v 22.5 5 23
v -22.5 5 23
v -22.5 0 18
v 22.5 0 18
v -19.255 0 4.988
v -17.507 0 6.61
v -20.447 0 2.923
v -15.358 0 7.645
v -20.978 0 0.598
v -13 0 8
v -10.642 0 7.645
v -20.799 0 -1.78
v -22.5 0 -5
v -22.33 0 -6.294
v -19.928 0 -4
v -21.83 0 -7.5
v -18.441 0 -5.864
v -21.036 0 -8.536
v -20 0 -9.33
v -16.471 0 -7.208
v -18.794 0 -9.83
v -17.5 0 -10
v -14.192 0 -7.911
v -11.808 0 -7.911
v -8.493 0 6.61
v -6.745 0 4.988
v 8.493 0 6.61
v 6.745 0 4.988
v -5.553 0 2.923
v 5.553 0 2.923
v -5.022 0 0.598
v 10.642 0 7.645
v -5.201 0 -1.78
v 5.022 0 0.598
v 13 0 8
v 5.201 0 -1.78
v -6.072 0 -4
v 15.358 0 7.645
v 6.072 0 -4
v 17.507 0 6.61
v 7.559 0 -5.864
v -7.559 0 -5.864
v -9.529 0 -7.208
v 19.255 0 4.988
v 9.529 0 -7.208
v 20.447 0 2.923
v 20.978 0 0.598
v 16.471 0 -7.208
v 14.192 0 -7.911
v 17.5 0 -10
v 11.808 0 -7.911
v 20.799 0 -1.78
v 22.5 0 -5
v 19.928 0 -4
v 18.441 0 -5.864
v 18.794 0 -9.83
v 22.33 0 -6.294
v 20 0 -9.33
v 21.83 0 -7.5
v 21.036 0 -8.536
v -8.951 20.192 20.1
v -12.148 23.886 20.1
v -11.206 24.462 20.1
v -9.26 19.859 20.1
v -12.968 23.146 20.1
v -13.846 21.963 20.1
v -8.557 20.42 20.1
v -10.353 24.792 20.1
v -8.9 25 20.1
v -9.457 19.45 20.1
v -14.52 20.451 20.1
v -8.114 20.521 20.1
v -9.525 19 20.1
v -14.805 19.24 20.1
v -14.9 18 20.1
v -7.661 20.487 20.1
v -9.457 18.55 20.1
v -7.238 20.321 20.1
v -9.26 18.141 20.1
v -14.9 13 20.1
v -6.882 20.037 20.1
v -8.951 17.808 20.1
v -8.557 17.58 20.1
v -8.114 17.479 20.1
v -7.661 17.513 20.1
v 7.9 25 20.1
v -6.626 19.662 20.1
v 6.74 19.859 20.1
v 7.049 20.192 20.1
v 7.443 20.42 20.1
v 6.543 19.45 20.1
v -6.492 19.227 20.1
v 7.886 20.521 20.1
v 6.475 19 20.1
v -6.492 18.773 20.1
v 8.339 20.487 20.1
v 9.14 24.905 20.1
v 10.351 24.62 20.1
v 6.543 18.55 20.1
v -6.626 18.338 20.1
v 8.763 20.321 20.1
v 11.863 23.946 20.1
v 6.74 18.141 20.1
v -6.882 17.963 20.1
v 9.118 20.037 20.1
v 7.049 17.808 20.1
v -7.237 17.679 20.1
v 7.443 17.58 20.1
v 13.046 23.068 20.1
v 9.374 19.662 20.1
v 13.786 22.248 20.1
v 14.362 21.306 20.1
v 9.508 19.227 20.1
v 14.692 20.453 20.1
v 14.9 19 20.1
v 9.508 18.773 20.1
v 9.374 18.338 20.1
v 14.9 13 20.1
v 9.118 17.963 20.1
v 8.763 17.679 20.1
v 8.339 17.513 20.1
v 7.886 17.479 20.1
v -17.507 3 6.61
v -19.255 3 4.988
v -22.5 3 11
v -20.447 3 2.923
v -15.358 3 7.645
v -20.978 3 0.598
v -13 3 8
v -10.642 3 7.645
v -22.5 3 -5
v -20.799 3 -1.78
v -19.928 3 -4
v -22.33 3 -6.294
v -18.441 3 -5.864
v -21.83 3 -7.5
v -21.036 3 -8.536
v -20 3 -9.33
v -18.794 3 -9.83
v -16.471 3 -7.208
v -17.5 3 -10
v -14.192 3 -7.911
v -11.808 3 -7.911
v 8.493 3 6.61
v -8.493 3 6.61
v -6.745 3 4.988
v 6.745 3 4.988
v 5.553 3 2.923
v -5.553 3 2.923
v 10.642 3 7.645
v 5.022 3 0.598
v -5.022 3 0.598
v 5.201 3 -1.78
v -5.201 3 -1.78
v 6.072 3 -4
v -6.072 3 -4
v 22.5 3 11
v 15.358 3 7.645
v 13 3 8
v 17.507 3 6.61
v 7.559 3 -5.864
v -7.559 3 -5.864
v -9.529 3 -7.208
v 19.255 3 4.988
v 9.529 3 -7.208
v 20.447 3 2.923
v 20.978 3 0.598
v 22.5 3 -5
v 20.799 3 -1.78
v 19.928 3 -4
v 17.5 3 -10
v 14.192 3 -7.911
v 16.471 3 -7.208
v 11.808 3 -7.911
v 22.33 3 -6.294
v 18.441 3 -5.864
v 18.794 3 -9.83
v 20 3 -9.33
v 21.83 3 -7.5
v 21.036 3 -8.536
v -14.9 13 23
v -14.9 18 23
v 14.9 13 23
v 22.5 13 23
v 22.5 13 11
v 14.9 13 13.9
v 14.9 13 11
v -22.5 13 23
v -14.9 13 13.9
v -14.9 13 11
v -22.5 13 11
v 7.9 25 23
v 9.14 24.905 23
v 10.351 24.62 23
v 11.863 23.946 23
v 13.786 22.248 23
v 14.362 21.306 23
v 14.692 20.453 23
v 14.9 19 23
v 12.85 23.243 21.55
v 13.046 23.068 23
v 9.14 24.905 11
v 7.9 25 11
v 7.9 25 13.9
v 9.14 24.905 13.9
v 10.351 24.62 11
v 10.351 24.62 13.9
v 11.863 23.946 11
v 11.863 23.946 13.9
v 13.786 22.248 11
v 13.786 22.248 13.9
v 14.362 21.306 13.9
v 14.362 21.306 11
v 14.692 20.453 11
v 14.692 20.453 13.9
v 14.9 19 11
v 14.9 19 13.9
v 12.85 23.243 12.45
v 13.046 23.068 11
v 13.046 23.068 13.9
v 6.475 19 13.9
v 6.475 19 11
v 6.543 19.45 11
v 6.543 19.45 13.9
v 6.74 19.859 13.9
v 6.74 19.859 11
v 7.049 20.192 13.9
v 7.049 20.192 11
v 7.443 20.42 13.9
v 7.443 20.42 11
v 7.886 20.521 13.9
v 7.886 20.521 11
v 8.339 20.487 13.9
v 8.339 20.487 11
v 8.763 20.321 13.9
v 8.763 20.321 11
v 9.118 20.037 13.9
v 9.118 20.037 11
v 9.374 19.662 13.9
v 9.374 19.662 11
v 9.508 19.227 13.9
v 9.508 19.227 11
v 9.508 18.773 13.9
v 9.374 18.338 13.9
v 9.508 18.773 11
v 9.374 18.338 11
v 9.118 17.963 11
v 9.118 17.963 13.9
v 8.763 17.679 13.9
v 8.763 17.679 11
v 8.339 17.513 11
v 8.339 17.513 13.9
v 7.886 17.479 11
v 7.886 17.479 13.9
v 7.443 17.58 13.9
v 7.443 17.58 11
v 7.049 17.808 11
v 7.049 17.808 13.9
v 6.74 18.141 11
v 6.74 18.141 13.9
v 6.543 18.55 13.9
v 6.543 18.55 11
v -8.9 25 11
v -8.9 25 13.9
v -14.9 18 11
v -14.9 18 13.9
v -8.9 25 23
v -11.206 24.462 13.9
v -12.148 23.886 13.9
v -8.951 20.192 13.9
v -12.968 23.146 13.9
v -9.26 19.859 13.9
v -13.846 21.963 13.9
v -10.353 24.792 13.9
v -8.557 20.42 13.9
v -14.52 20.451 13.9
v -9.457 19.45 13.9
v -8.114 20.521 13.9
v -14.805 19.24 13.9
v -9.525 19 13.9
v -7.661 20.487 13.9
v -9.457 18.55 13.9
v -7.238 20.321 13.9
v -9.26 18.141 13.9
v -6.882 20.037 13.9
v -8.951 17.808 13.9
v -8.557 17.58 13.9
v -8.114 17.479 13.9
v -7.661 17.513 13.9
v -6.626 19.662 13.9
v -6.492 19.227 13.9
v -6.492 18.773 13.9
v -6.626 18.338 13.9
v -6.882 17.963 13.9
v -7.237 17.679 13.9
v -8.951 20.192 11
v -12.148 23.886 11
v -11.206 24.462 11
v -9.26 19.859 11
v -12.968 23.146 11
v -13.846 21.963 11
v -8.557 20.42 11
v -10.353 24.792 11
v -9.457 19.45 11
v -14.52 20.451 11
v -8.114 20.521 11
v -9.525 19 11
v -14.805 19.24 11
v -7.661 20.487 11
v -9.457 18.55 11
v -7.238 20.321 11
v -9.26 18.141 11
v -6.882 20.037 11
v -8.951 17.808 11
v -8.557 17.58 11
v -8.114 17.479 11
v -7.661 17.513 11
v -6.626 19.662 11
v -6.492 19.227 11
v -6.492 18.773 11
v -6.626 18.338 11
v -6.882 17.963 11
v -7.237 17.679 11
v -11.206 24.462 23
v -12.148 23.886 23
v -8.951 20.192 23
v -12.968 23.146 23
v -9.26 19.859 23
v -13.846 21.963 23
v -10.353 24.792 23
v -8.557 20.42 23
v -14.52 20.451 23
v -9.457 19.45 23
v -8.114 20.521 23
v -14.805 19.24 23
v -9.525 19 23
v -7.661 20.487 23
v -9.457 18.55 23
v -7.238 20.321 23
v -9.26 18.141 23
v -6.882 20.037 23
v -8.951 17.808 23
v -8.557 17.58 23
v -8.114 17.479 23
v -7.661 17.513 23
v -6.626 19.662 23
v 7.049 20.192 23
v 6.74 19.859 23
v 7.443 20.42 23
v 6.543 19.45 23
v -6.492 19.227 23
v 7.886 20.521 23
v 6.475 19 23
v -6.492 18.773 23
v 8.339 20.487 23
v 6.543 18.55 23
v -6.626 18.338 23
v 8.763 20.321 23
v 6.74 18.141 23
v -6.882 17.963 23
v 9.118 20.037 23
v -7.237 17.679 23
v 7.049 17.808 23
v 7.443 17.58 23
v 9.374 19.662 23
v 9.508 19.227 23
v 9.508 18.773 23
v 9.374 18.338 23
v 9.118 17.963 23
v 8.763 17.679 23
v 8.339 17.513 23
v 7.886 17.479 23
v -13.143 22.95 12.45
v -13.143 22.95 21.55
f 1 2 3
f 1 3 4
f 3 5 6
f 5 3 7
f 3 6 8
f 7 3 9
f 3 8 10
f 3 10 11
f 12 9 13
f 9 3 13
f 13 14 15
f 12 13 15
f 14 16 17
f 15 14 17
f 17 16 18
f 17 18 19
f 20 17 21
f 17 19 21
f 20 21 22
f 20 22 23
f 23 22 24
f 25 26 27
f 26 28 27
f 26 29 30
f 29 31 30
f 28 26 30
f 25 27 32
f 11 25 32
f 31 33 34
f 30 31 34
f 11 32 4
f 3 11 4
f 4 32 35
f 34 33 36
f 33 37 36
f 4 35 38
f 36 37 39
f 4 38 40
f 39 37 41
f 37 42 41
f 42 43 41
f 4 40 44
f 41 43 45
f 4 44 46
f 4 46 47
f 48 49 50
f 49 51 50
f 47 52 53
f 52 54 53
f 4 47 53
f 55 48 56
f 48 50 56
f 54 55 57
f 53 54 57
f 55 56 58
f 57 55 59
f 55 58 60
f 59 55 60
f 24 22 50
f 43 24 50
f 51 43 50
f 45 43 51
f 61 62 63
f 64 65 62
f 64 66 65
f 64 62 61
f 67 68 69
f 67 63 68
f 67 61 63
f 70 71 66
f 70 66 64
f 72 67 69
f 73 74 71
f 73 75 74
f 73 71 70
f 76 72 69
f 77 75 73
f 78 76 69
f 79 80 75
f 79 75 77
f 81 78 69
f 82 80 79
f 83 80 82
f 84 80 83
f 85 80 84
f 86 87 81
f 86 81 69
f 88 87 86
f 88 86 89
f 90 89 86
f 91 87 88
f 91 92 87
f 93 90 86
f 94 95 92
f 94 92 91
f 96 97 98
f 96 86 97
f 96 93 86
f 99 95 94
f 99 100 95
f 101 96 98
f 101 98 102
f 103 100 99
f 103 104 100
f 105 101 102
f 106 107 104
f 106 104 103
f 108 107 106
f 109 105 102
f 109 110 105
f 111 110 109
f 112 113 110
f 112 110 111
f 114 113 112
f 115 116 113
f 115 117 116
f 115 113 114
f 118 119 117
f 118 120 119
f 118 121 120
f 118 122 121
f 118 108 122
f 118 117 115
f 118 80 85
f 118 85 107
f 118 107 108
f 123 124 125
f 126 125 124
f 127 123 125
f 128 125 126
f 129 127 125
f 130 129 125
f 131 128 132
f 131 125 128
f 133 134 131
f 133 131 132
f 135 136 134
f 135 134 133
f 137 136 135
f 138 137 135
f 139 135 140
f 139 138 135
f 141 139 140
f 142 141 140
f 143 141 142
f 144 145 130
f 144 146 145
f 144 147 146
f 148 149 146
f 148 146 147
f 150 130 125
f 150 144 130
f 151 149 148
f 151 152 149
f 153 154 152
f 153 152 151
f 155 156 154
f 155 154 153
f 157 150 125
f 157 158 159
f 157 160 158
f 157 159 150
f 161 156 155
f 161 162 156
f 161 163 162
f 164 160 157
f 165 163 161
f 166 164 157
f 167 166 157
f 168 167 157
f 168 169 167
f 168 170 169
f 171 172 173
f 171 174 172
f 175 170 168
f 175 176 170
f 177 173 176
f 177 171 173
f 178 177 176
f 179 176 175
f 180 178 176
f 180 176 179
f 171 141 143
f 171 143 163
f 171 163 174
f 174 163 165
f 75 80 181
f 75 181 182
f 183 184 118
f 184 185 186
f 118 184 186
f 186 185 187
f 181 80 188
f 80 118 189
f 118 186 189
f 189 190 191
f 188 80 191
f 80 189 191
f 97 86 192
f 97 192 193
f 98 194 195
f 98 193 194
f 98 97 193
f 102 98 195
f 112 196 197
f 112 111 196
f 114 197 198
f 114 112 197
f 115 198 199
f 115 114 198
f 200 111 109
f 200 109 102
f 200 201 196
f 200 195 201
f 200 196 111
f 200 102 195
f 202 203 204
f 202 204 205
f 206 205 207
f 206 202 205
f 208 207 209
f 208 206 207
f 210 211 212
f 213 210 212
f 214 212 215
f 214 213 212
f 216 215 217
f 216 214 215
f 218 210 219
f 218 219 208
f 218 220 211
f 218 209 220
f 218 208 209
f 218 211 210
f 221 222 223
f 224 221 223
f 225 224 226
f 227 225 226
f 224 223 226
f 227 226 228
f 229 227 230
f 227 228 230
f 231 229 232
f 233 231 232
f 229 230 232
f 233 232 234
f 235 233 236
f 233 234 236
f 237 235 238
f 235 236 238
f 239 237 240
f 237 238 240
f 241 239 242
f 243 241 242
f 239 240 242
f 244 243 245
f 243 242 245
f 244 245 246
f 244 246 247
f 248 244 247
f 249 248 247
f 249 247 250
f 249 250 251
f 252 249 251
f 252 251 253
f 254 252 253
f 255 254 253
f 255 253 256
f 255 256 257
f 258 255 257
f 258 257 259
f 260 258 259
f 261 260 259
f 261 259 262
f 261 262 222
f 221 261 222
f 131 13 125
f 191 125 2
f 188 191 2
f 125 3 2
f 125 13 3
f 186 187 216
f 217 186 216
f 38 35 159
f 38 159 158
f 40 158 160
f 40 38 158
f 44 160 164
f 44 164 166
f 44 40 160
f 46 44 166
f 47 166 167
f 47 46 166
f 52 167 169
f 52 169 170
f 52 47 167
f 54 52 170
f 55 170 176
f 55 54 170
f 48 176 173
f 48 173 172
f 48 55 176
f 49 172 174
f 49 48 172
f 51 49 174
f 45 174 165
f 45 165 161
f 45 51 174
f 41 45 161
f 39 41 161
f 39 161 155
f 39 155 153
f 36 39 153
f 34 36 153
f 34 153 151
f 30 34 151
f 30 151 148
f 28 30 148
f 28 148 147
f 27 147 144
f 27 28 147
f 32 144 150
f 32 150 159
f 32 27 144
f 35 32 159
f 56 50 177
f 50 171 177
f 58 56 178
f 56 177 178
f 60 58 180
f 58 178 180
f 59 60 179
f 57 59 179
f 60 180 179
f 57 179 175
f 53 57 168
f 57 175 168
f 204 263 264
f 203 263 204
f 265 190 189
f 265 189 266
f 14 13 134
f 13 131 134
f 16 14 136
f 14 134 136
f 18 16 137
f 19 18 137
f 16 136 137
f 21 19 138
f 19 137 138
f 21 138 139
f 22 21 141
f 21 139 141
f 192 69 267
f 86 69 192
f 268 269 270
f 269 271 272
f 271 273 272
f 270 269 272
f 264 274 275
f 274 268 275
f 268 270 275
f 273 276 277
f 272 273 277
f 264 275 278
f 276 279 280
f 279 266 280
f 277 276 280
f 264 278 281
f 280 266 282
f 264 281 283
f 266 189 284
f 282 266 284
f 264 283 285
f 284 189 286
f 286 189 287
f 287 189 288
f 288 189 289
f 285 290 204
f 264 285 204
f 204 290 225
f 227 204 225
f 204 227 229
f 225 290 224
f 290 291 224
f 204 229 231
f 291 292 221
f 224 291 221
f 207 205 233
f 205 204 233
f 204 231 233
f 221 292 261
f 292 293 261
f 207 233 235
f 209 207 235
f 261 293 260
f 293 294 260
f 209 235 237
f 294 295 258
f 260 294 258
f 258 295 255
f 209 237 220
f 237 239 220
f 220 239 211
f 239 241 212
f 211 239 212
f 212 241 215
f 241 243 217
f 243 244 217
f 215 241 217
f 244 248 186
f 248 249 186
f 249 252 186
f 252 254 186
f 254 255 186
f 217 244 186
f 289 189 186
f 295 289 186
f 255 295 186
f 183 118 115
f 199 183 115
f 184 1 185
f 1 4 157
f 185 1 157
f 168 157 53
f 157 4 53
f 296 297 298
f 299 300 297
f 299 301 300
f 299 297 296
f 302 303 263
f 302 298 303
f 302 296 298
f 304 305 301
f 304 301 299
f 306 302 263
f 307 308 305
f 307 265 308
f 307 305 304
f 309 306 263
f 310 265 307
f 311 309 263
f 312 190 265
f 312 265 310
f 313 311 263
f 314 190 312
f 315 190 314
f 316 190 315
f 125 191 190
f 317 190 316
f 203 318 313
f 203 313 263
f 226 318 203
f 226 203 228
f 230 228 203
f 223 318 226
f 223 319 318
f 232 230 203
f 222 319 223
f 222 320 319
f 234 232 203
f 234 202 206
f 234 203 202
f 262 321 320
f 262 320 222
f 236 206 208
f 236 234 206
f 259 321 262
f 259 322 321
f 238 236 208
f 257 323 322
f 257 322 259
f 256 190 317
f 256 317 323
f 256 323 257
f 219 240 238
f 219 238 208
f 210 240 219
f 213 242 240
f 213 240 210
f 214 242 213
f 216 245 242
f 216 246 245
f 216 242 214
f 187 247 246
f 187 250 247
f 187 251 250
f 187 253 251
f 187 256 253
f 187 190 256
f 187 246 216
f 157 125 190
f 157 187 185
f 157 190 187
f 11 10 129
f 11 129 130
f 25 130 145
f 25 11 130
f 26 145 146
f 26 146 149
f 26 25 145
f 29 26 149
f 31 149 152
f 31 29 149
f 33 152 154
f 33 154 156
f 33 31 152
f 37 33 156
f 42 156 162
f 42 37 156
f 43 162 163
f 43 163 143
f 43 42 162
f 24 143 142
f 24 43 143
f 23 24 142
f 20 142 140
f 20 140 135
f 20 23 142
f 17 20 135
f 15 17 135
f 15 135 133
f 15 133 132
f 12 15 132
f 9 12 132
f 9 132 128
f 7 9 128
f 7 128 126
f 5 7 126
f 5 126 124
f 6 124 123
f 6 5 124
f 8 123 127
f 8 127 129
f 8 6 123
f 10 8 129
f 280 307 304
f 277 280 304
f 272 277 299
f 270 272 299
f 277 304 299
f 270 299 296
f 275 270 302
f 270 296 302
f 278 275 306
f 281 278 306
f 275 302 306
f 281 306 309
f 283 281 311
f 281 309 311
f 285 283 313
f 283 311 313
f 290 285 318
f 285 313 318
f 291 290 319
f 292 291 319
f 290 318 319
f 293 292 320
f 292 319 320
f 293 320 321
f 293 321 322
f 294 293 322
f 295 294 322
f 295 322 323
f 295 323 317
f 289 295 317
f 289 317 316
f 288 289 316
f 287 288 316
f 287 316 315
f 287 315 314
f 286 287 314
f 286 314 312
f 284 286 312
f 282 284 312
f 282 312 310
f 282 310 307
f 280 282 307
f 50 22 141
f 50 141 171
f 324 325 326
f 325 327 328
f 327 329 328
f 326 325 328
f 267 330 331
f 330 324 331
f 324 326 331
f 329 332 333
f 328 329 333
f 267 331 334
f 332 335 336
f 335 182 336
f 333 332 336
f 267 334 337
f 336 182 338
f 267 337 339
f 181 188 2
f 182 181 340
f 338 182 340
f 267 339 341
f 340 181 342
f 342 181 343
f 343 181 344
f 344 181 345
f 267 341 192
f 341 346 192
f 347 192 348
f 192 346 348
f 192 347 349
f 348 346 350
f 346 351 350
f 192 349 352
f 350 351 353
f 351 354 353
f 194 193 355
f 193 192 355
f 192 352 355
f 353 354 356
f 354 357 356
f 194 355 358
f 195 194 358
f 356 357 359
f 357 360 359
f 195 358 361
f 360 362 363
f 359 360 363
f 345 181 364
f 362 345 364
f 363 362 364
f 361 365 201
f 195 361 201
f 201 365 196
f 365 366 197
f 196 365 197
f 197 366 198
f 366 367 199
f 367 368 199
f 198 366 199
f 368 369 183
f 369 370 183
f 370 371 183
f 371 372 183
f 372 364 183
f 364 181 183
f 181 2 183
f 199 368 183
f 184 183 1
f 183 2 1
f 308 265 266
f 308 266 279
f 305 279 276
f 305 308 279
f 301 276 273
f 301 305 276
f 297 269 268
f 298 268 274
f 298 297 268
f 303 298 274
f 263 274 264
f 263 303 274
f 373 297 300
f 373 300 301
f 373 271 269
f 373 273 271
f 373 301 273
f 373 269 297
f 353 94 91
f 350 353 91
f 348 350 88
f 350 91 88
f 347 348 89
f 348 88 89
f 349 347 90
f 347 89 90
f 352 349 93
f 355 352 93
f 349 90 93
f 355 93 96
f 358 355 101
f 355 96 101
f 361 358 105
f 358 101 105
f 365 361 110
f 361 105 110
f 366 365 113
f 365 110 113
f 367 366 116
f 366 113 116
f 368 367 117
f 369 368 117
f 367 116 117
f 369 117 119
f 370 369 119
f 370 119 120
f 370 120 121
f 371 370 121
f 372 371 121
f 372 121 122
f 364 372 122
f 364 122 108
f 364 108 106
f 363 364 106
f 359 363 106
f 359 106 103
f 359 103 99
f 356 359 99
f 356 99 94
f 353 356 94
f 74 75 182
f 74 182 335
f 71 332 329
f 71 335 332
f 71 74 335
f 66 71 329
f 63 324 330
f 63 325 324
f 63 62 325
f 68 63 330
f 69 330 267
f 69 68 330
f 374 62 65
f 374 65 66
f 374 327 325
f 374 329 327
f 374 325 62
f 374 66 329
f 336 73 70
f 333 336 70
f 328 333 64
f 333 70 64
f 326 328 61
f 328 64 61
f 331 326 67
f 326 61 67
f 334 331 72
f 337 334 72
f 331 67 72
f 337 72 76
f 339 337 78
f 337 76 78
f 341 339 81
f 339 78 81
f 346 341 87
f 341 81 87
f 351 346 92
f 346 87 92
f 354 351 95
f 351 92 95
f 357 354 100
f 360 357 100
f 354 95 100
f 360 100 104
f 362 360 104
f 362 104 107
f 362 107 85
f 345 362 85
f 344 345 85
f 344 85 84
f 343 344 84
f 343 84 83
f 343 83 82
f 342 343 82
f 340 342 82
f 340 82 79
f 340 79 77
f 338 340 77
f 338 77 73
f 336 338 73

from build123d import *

# Parameters (mm, degrees)
SKETCH1_W           = 45
SKETCH1_H           = 20
SKETCH1_R           = 8
SKETCH1_H_2         = 13
SKETCH1_H_3         = 1
BOSS_EXTRUDE1_DEPTH = 3
SKETCH3_W           = 45
SKETCH3_H           = 2.9
SKETCH3_H_2         = 6.2
BOSS_EXTRUDE2_DEPTH = 10
SKETCH3_3_W         = 45
SKETCH3_3_H         = 2.9
BOSS_EXTRUDE3_DEPTH = 22
SKETCH6_R           = 1.525
SKETCH6_W           = 7.6
SKETCH6_H           = 12
CUT_EXTRUDE2_DEPTH  = 16.5
CHAMFER1_SIZE       = 5
FILLET2_R           = 5
FILLET3_SIZE        = 7
FILLET3_SIZE_2      = 6


with BuildPart() as part:
    # Sketch1 → Boss-Extrude1 (new body)
    # profile 1 of 3: a face of its own
    with BuildSketch(Plane(origin=(0, 0, 0), x_dir=(1, 0, 0), z_dir=(0, 1, 0))):
        Rectangle(SKETCH1_W, SKETCH1_H)
        with Locations(Location((13, 0, 0), (0, 0, 270))):
            Circle(SKETCH1_R, mode=Mode.SUBTRACT)
        with Locations(Location((-13, 0, 0), (0, 0, 270))):
            Circle(SKETCH1_R, mode=Mode.SUBTRACT)
    # profile 2 of 3: a face of its own
    with BuildSketch(Plane(origin=(0, 0, 0), x_dir=(1, 0, 0), z_dir=(0, 1, 0))):
        with Locations((0, -16.5)):
            Rectangle(SKETCH1_W, SKETCH1_H_2)
    # profile 3 of 3: a face of its own
    with BuildSketch(Plane(origin=(0, 0, 0), x_dir=(1, 0, 0), z_dir=(0, 1, 0))):
        with Locations((0, -10.5)):
            Rectangle(SKETCH1_W, SKETCH1_H_3)
    extrude(amount=BOSS_EXTRUDE1_DEPTH)

    # Sketch3 → Boss-Extrude2 (add)
    with BuildSketch(Plane(origin=(0, 3, 0), x_dir=(1, 0, 0), z_dir=(0, 1, 0))):
        with Locations((0, -21.55)):
            Rectangle(SKETCH3_W, SKETCH3_H)
        with Locations((0, -17)):
            Rectangle(SKETCH3_W, SKETCH3_H_2)
        with Locations((0, -12.45)):
            Rectangle(SKETCH3_W, SKETCH3_H)
    extrude(amount=BOSS_EXTRUDE2_DEPTH)

    # Sketch3<3> → Boss-Extrude3 (add)
    with BuildSketch(Plane(origin=(0, 3, 0), x_dir=(1, 0, 0), z_dir=(0, 1, 0))):
        with Locations((0, -12.45)):
            Rectangle(SKETCH3_3_W, SKETCH3_3_H)
        with Locations((0, -21.55)):
            Rectangle(SKETCH3_3_W, SKETCH3_3_H)
    extrude(amount=BOSS_EXTRUDE3_DEPTH)

    # Sketch6 → Cut-Extrude2 (cut)
    with BuildSketch(Plane(origin=(0, 0, 11), x_dir=(-1, 0, 0), z_dir=(0, 0, -1))):
        with Locations((-8, 19)):
            Circle(SKETCH6_R)
        with Locations((8, 19)):
            Circle(SKETCH6_R)
        with Locations((-18.7, 19)):
            Rectangle(SKETCH6_W, SKETCH6_H)
        with Locations((18.7, 19)):
            Rectangle(SKETCH6_W, SKETCH6_H)
    extrude(amount=-CUT_EXTRUDE2_DEPTH, mode=Mode.SUBTRACT)

    # Chamfer1
    chamfer1_edges = [part.edges().sort_by_distance(p)[0] for p in [
        (0, 0, 23),
    ]]
    chamfer(chamfer1_edges, length=CHAMFER1_SIZE)

    # Fillet2
    fillet2_edges = [part.edges().sort_by_distance(p)[0] for p in [
        (-22.5, 1.5, -10),
        (22.5, 1.5, -10),
    ]]
    fillet(fillet2_edges, radius=FILLET2_R)

    # Fillet3
    # an asymmetric fillet: 7, 6 mm, written as the material it takes off along each edge
    with BuildSketch(Plane(origin=(14.9, 25, -6.5), x_dir=(-1, 0, 0), z_dir=(0, 0, 1)), Plane(origin=(-14.9, 25, -6.5), x_dir=(0, -1, 0), z_dir=(0, 0, 1))) as fillet3_piece_1:
        with BuildLine():
            Bezier((FILLET3_SIZE, 0), (0, 0), (0, FILLET3_SIZE_2), weights=[1, 0.707106781, 1])
            Line((0, FILLET3_SIZE_2), (0, 0))
            Line((0, 0), (FILLET3_SIZE, 0))
        make_face()
    extrude(amount=37.9, mode=Mode.SUBTRACT)
    with BuildSketch(Plane(origin=(14.9, 25, 2.6), x_dir=(0, -1, 0), z_dir=(0, 0, 1)), Plane(origin=(-14.9, 25, 2.6), x_dir=(1, 0, 0), z_dir=(0, 0, 1))) as fillet3_piece_2:
        with BuildLine():
            Bezier((FILLET3_SIZE_2, 0), (0, 0), (0, -FILLET3_SIZE), weights=[1, 0.707106781, 1])
            Line((0, -FILLET3_SIZE), (0, 0))
            Line((0, 0), (FILLET3_SIZE_2, 0))
        make_face()
    extrude(amount=37.9, mode=Mode.SUBTRACT)


solid = part.part
